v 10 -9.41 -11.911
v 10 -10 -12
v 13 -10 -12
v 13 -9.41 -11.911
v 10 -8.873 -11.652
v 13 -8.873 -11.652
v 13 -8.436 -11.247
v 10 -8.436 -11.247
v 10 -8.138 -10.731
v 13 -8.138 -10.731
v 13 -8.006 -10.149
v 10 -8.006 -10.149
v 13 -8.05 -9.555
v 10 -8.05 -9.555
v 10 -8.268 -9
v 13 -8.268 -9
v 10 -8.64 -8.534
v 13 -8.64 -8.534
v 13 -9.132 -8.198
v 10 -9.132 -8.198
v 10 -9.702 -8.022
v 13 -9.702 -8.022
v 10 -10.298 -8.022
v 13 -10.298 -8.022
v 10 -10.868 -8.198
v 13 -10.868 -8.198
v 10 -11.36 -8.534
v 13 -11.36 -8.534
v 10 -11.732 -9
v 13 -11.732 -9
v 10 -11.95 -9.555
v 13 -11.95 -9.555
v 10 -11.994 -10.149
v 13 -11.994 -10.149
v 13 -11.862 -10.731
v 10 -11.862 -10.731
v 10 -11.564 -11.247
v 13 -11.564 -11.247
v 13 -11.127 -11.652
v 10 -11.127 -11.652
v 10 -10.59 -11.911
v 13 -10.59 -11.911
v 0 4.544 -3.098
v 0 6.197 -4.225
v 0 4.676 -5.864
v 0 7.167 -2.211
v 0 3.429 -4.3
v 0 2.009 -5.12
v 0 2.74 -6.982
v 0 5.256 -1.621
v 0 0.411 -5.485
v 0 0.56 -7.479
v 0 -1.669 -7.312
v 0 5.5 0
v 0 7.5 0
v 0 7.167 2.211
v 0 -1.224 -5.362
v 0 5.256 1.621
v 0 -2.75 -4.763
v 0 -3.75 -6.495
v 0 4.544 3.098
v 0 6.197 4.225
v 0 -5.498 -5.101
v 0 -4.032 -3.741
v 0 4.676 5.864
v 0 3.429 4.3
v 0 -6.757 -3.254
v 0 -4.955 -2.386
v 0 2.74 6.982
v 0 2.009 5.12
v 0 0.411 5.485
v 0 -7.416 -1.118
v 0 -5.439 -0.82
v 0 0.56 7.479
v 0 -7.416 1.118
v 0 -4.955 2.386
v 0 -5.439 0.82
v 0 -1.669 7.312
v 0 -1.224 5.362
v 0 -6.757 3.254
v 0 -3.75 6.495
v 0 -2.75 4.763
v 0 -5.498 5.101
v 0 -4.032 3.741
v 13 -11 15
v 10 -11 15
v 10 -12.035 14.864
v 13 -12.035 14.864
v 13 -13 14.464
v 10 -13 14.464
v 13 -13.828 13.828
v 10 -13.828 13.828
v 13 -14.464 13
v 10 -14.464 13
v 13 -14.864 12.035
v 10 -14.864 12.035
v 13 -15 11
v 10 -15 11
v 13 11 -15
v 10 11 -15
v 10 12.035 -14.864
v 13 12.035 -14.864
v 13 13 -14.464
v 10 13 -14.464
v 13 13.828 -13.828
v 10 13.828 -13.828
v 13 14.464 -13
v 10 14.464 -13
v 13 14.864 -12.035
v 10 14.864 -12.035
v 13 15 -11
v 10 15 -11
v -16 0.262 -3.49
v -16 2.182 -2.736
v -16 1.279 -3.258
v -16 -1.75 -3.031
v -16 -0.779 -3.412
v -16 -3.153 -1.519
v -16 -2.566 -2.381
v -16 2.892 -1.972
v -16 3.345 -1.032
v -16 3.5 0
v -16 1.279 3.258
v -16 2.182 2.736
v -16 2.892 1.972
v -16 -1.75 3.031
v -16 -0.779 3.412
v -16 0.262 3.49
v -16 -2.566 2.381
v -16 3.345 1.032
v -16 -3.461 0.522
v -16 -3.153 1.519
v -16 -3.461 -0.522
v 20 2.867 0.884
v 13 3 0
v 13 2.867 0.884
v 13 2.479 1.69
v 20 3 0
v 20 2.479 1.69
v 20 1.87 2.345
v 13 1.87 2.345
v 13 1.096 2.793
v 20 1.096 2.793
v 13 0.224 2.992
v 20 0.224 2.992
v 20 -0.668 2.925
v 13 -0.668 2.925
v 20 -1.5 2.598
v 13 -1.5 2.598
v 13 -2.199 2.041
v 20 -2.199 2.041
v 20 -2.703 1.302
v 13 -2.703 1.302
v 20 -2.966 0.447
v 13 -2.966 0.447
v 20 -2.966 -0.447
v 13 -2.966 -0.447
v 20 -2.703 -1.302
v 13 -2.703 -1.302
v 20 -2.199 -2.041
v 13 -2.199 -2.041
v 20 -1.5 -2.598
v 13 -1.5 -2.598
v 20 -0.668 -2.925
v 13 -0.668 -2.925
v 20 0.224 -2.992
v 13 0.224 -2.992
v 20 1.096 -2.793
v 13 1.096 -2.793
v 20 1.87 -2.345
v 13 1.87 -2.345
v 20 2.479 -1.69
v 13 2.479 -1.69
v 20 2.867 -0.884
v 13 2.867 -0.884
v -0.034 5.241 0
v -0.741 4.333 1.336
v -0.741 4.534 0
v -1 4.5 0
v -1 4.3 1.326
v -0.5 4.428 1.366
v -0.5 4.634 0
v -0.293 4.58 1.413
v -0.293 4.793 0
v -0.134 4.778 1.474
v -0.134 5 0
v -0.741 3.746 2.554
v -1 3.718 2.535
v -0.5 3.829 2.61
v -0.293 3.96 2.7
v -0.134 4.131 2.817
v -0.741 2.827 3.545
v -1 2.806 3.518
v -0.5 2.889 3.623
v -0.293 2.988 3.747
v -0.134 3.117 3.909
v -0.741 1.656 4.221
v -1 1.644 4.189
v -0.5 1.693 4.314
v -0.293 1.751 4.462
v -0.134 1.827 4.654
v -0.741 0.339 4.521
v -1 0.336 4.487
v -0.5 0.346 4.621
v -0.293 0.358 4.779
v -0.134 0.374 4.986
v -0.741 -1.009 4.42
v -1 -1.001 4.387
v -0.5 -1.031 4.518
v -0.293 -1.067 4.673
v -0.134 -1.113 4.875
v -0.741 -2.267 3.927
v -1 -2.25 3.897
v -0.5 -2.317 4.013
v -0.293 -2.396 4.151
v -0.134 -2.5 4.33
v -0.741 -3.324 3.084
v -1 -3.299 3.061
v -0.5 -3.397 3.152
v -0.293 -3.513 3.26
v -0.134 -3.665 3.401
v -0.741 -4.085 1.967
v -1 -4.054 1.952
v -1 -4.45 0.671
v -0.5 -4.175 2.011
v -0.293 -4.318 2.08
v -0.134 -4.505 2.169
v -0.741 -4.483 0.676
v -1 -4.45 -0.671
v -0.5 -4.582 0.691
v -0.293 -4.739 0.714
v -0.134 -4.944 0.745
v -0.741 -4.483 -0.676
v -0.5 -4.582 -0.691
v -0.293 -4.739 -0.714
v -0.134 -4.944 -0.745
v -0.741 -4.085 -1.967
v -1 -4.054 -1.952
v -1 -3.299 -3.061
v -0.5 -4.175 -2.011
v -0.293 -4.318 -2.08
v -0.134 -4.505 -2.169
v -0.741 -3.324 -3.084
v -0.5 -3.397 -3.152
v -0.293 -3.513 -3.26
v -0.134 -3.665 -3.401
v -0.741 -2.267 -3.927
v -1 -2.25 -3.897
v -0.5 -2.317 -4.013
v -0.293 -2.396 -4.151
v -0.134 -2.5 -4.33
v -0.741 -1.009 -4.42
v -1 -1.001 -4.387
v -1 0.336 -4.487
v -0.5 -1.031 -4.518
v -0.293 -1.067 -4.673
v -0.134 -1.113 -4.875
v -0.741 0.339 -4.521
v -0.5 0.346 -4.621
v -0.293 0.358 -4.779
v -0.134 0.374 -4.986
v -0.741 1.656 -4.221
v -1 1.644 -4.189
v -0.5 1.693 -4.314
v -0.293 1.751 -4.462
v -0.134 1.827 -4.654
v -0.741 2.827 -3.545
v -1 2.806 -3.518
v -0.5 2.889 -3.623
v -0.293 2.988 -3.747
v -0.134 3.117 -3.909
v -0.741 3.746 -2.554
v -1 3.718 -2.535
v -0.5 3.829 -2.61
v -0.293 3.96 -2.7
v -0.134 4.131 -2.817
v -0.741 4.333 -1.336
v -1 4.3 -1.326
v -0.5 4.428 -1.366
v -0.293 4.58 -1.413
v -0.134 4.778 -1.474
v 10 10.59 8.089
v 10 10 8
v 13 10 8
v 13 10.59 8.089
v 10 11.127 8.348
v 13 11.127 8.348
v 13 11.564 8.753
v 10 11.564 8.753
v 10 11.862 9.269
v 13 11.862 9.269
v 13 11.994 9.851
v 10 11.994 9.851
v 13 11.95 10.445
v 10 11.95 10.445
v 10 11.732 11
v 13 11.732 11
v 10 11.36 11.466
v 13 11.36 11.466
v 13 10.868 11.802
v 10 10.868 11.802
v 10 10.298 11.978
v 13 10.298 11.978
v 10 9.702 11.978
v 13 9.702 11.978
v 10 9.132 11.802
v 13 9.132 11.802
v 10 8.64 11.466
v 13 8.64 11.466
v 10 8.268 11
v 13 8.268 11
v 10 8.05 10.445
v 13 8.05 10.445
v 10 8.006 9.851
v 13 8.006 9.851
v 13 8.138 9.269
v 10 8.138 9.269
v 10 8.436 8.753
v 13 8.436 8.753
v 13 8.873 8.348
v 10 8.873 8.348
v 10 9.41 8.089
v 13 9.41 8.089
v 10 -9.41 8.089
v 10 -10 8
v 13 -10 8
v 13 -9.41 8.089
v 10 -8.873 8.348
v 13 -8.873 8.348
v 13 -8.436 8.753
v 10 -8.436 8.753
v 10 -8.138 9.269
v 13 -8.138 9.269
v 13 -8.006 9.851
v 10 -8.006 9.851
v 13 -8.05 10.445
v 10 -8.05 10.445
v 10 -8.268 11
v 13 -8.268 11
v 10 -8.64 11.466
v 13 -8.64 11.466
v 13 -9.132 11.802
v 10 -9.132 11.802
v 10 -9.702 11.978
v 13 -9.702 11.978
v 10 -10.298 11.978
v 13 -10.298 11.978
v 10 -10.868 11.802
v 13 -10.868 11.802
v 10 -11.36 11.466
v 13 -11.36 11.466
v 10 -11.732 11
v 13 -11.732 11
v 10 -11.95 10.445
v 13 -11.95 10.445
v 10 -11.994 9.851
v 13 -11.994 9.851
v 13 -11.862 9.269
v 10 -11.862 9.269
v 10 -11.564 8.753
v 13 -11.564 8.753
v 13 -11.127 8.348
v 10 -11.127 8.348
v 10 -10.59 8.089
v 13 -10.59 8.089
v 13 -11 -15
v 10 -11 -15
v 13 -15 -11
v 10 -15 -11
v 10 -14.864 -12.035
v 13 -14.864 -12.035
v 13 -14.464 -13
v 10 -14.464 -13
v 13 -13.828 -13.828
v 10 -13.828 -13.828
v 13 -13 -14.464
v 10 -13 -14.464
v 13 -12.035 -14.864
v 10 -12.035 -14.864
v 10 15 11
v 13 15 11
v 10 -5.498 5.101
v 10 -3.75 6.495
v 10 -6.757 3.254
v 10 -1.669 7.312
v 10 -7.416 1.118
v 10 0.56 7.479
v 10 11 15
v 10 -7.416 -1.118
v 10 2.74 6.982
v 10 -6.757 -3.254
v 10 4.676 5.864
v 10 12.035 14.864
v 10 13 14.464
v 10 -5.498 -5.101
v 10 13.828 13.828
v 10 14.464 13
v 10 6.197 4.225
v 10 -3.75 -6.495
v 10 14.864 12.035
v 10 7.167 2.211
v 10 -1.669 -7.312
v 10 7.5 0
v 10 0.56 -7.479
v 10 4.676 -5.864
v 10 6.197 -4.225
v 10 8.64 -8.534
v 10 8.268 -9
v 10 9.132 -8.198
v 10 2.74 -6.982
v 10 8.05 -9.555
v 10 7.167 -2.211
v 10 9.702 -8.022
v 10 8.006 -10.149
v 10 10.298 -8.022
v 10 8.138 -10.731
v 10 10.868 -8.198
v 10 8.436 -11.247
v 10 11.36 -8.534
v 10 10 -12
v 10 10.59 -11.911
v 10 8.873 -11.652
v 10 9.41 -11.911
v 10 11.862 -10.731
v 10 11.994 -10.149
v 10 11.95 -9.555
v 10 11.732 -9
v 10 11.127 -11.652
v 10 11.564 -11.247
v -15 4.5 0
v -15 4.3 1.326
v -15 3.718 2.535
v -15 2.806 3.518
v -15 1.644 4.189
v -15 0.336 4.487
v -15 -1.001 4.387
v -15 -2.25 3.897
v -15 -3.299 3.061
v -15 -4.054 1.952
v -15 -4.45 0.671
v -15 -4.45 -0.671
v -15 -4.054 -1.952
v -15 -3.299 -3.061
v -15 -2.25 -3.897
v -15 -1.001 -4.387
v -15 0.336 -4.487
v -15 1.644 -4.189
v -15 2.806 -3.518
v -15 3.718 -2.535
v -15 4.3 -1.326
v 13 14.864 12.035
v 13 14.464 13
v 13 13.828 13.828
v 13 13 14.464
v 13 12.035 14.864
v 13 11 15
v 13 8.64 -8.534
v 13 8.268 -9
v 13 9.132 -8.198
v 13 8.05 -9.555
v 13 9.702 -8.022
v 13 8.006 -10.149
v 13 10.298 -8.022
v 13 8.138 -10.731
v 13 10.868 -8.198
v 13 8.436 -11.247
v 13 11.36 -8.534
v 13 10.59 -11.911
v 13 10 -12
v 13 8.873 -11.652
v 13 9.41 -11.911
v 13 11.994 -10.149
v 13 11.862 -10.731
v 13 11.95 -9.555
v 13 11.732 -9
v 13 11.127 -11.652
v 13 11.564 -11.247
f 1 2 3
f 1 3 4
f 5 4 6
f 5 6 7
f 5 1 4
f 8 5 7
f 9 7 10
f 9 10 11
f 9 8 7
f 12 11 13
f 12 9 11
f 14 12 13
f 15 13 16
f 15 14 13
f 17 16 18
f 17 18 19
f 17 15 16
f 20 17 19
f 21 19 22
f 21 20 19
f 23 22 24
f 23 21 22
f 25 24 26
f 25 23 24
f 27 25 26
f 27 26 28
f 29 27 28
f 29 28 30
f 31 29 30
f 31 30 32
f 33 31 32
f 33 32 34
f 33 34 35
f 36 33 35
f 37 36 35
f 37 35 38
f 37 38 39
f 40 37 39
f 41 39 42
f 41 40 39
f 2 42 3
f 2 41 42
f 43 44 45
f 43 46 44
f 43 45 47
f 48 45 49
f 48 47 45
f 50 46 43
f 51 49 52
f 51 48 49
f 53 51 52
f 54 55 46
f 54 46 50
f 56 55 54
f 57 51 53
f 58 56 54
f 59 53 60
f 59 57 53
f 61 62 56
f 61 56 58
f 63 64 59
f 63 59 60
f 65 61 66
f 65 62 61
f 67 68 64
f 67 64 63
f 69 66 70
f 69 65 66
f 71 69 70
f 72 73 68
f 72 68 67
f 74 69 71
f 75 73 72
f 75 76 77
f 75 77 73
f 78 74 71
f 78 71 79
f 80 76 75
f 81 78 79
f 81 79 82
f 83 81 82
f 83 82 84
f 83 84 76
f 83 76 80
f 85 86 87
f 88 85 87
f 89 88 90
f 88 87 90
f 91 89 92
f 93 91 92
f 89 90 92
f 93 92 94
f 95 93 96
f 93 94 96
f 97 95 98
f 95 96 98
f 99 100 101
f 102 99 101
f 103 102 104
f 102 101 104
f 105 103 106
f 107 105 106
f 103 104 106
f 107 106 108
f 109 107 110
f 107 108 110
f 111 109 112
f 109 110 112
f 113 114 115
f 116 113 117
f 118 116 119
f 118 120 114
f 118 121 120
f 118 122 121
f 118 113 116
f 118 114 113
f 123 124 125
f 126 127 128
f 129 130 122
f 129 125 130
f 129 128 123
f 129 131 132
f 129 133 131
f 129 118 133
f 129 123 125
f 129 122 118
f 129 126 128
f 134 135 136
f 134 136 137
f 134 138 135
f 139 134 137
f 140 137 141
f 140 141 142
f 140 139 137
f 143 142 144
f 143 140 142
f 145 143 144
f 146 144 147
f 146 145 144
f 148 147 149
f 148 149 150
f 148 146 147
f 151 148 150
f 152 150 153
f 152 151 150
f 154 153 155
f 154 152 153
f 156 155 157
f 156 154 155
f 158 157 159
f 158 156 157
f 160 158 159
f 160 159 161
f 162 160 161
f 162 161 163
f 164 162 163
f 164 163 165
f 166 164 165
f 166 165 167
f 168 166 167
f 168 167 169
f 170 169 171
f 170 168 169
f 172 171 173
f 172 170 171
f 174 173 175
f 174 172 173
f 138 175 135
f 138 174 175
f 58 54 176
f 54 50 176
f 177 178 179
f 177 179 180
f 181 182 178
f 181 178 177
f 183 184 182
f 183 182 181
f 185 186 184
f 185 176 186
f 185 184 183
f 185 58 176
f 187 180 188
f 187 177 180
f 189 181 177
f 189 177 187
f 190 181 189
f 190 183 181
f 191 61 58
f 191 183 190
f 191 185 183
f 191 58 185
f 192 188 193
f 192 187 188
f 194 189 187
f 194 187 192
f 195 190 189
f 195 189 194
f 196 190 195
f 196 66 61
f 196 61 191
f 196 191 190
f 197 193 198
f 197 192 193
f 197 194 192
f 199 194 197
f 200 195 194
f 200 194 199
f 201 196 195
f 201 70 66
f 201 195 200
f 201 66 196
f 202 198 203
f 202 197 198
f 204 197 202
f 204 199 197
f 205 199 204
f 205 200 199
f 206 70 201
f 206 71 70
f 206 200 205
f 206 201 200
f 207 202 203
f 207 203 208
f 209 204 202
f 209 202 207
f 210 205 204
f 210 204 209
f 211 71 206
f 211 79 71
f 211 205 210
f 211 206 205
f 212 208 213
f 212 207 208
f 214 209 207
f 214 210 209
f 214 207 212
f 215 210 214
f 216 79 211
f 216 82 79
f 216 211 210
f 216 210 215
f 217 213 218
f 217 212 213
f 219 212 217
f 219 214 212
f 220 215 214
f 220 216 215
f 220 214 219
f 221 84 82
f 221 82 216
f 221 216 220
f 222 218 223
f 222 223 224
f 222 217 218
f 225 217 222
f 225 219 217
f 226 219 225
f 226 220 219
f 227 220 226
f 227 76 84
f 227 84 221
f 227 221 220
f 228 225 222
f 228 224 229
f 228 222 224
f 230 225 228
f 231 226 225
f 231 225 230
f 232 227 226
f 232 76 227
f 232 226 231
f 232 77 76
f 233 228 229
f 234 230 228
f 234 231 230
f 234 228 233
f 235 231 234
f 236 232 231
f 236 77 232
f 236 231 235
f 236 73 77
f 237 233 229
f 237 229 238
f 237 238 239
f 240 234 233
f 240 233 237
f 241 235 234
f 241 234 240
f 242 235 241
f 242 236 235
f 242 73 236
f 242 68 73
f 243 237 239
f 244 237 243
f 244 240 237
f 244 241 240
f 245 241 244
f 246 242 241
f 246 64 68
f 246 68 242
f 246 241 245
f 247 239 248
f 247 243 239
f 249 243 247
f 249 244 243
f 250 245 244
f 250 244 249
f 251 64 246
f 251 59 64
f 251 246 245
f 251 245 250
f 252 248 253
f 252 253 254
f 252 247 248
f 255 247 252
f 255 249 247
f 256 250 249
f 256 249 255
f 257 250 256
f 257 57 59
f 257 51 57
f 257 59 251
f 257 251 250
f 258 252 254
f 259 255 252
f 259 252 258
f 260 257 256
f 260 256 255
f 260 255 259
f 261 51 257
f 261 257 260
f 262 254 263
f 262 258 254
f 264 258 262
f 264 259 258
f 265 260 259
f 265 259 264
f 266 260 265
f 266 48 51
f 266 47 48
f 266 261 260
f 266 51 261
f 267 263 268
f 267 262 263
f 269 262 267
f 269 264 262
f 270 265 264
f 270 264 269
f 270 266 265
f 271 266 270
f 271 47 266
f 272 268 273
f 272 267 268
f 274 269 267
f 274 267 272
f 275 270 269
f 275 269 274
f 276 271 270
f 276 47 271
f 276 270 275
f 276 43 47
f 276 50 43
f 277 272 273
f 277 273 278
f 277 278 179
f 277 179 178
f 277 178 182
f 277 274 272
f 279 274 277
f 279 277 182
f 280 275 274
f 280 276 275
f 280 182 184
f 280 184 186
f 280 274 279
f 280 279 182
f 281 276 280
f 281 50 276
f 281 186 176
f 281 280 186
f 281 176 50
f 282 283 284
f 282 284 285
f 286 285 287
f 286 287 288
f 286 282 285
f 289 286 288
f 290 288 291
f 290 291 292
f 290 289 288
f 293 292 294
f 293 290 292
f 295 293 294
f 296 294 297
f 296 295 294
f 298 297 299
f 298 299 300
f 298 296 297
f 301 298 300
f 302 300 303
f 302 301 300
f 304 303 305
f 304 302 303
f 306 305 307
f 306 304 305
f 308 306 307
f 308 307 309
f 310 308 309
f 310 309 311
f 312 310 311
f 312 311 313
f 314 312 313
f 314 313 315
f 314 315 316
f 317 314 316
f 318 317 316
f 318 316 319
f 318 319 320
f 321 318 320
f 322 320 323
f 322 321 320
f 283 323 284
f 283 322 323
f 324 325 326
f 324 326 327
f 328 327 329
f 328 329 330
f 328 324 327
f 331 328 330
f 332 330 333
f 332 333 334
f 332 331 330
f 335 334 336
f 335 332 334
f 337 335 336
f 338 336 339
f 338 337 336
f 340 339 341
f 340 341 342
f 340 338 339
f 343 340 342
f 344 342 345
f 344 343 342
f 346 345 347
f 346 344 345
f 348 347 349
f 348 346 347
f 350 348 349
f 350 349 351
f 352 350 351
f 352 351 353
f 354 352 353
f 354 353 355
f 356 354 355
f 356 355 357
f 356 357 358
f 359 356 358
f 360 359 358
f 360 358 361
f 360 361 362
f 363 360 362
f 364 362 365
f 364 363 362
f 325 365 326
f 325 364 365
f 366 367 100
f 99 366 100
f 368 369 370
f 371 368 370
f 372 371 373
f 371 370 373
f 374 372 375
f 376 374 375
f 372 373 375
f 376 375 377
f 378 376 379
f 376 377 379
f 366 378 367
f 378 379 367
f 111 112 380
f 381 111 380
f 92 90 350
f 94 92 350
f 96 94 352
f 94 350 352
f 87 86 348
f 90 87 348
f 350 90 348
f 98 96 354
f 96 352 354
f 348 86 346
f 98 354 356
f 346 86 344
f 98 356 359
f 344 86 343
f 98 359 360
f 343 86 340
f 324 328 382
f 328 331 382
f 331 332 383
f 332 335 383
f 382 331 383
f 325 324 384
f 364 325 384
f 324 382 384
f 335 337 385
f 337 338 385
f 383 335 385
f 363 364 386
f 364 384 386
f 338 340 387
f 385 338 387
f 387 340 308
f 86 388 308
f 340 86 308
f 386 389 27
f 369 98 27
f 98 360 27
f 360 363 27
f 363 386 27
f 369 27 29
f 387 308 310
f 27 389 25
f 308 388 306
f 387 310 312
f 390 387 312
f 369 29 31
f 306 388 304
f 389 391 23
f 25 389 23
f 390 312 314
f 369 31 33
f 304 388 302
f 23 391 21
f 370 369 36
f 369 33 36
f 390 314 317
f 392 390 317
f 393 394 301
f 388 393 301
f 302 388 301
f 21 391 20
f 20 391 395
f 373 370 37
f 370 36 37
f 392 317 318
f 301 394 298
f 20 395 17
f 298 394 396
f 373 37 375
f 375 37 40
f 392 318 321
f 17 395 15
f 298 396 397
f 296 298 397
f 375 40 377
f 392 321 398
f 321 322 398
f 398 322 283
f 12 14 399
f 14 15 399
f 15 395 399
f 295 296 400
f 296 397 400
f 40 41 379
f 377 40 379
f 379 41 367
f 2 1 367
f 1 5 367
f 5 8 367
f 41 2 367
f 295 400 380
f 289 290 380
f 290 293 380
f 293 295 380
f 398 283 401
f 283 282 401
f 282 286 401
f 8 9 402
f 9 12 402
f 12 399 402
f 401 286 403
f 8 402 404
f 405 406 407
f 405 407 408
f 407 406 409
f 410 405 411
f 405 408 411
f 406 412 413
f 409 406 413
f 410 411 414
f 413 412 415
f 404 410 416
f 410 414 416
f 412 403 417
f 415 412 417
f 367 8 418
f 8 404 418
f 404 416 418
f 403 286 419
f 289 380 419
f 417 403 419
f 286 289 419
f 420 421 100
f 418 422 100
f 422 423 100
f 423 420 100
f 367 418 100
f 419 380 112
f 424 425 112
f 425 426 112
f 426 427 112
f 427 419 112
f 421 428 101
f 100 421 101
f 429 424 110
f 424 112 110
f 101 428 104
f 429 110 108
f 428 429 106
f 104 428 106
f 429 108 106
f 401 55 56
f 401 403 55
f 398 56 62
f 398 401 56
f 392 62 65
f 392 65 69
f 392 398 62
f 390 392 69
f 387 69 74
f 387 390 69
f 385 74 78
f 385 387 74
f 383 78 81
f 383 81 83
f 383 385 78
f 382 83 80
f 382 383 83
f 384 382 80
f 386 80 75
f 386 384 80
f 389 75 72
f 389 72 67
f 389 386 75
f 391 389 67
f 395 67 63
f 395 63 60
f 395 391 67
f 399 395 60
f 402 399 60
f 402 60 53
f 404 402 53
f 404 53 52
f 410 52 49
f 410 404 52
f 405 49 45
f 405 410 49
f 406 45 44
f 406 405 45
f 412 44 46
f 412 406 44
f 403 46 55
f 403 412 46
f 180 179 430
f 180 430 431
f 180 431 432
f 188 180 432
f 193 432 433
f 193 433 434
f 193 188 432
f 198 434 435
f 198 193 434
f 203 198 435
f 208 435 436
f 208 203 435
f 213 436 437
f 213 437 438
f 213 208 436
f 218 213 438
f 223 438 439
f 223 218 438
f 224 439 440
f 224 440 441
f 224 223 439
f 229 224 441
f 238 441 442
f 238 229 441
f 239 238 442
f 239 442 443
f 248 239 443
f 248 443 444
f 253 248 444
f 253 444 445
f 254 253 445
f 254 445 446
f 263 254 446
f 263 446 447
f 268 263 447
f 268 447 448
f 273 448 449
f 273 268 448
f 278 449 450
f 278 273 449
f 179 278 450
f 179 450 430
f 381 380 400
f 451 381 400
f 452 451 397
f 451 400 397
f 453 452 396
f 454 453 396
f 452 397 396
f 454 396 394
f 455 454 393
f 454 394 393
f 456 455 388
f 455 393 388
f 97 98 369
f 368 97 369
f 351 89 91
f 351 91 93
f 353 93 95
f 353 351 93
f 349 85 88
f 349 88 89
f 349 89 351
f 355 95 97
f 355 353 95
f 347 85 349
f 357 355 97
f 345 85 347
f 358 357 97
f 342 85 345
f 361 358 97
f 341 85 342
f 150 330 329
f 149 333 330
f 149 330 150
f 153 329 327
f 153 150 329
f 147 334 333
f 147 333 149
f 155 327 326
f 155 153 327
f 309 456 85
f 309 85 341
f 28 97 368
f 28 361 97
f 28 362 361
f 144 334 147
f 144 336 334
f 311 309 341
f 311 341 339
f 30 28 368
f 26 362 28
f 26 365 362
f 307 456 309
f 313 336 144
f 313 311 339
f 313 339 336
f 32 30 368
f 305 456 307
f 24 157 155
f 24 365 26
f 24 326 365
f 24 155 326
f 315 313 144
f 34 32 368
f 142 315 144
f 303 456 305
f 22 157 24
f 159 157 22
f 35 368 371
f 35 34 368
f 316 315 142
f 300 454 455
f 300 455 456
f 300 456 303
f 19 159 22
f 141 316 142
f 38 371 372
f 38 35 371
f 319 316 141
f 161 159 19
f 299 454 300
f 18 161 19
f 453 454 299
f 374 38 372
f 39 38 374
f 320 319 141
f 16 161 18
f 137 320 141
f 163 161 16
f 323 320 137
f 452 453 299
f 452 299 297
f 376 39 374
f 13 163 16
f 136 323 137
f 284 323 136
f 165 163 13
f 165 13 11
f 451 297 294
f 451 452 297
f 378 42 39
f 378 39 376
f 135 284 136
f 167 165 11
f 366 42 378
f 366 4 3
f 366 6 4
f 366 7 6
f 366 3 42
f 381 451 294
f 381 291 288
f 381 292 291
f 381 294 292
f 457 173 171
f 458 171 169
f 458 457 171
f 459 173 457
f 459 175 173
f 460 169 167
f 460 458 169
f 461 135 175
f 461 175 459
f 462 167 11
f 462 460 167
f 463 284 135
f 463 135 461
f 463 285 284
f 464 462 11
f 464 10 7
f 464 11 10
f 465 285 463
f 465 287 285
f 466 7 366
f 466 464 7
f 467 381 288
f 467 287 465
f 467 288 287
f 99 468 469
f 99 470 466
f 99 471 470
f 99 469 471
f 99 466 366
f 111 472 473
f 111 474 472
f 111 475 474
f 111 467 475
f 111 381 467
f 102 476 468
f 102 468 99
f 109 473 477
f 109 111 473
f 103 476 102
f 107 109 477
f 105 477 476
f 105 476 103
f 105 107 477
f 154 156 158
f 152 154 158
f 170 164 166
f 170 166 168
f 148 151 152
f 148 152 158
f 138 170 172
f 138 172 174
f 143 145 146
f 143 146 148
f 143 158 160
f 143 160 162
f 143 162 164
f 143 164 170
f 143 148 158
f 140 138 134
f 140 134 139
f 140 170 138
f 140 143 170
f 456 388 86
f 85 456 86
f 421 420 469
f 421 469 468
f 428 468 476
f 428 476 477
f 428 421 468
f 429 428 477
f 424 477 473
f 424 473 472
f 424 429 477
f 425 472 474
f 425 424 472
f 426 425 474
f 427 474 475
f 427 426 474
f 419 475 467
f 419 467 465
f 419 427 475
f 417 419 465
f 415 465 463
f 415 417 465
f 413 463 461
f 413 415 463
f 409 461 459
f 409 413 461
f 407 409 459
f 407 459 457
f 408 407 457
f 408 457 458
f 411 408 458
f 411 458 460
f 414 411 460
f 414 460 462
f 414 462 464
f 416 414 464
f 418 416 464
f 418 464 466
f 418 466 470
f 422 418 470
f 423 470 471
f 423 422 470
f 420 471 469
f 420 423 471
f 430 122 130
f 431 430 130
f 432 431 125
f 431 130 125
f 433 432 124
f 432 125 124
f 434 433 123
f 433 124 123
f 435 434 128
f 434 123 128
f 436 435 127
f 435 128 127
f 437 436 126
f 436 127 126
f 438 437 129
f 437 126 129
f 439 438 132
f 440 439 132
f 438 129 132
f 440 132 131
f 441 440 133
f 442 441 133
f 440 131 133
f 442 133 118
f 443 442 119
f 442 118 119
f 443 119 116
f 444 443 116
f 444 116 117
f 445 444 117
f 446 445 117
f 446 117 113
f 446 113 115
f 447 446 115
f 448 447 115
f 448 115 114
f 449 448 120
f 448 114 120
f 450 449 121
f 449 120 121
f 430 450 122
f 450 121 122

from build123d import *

# Parameters (mm, degrees)
REDONDEO1_R             = 1
CHAFL_N1_SIZE           = 1
CROQUIS2_R              = 2
SALIENTE_EXTRUIR1_DEPTH = 3


with BuildPart() as part:
    # Croquis1 → Revolución1 (revolve)
    with BuildSketch(Plane.XY):
        Polygon((-16, 0), (-16, 4.5), (0, 4.5), (0, 7.5), (10, 7.5), (10, 3), (20, 3), (20, 0), align=None)
    revolve(axis=Axis((-18.371134021, 0, 0), (1, 0, 0)))

    # Redondeo1
    redondeo1_edges = [part.edges().sort_by_distance(p)[0] for p in [
        (0, -4.5, 0),
    ]]
    fillet(redondeo1_edges, radius=REDONDEO1_R)

    # Chaflán1
    chafl_n1_edges = [part.edges().sort_by_distance(p)[0] for p in [
        (-16, -4.5, 0),
    ]]
    chamfer(chafl_n1_edges, length=CHAFL_N1_SIZE)

    # Croquis2 → Saliente-Extruir1 (add)
    with BuildSketch(Plane(origin=(10, 0, 0), x_dir=(0, 0, -1), z_dir=(1, 0, 0))):
        with BuildLine():
            Line((-11, -15), (11, -15))
            ThreePointArc((11, -15), (13.828427125, -13.828427125), (15, -11))
            Line((15, -11), (15, 11))
            ThreePointArc((15, 11), (13.828427125, 13.828427125), (11, 15))
            Line((11, 15), (-11, 15))
            ThreePointArc((-11, 15), (-13.828427125, 13.828427125), (-15, 11))
            Line((-15, 11), (-15, -11))
            ThreePointArc((-15, -11), (-13.828427125, -13.828427125), (-11, -15))
        make_face()
        with Locations((-10, 10)):
            Circle(CROQUIS2_R, mode=Mode.SUBTRACT)
        with Locations((10, 10)):
            Circle(CROQUIS2_R, mode=Mode.SUBTRACT)
        with Locations((10, -10)):
            Circle(CROQUIS2_R, mode=Mode.SUBTRACT)
        with Locations((-10, -10)):
            Circle(CROQUIS2_R, mode=Mode.SUBTRACT)
    extrude(amount=SALIENTE_EXTRUIR1_DEPTH)


solid = part.part
